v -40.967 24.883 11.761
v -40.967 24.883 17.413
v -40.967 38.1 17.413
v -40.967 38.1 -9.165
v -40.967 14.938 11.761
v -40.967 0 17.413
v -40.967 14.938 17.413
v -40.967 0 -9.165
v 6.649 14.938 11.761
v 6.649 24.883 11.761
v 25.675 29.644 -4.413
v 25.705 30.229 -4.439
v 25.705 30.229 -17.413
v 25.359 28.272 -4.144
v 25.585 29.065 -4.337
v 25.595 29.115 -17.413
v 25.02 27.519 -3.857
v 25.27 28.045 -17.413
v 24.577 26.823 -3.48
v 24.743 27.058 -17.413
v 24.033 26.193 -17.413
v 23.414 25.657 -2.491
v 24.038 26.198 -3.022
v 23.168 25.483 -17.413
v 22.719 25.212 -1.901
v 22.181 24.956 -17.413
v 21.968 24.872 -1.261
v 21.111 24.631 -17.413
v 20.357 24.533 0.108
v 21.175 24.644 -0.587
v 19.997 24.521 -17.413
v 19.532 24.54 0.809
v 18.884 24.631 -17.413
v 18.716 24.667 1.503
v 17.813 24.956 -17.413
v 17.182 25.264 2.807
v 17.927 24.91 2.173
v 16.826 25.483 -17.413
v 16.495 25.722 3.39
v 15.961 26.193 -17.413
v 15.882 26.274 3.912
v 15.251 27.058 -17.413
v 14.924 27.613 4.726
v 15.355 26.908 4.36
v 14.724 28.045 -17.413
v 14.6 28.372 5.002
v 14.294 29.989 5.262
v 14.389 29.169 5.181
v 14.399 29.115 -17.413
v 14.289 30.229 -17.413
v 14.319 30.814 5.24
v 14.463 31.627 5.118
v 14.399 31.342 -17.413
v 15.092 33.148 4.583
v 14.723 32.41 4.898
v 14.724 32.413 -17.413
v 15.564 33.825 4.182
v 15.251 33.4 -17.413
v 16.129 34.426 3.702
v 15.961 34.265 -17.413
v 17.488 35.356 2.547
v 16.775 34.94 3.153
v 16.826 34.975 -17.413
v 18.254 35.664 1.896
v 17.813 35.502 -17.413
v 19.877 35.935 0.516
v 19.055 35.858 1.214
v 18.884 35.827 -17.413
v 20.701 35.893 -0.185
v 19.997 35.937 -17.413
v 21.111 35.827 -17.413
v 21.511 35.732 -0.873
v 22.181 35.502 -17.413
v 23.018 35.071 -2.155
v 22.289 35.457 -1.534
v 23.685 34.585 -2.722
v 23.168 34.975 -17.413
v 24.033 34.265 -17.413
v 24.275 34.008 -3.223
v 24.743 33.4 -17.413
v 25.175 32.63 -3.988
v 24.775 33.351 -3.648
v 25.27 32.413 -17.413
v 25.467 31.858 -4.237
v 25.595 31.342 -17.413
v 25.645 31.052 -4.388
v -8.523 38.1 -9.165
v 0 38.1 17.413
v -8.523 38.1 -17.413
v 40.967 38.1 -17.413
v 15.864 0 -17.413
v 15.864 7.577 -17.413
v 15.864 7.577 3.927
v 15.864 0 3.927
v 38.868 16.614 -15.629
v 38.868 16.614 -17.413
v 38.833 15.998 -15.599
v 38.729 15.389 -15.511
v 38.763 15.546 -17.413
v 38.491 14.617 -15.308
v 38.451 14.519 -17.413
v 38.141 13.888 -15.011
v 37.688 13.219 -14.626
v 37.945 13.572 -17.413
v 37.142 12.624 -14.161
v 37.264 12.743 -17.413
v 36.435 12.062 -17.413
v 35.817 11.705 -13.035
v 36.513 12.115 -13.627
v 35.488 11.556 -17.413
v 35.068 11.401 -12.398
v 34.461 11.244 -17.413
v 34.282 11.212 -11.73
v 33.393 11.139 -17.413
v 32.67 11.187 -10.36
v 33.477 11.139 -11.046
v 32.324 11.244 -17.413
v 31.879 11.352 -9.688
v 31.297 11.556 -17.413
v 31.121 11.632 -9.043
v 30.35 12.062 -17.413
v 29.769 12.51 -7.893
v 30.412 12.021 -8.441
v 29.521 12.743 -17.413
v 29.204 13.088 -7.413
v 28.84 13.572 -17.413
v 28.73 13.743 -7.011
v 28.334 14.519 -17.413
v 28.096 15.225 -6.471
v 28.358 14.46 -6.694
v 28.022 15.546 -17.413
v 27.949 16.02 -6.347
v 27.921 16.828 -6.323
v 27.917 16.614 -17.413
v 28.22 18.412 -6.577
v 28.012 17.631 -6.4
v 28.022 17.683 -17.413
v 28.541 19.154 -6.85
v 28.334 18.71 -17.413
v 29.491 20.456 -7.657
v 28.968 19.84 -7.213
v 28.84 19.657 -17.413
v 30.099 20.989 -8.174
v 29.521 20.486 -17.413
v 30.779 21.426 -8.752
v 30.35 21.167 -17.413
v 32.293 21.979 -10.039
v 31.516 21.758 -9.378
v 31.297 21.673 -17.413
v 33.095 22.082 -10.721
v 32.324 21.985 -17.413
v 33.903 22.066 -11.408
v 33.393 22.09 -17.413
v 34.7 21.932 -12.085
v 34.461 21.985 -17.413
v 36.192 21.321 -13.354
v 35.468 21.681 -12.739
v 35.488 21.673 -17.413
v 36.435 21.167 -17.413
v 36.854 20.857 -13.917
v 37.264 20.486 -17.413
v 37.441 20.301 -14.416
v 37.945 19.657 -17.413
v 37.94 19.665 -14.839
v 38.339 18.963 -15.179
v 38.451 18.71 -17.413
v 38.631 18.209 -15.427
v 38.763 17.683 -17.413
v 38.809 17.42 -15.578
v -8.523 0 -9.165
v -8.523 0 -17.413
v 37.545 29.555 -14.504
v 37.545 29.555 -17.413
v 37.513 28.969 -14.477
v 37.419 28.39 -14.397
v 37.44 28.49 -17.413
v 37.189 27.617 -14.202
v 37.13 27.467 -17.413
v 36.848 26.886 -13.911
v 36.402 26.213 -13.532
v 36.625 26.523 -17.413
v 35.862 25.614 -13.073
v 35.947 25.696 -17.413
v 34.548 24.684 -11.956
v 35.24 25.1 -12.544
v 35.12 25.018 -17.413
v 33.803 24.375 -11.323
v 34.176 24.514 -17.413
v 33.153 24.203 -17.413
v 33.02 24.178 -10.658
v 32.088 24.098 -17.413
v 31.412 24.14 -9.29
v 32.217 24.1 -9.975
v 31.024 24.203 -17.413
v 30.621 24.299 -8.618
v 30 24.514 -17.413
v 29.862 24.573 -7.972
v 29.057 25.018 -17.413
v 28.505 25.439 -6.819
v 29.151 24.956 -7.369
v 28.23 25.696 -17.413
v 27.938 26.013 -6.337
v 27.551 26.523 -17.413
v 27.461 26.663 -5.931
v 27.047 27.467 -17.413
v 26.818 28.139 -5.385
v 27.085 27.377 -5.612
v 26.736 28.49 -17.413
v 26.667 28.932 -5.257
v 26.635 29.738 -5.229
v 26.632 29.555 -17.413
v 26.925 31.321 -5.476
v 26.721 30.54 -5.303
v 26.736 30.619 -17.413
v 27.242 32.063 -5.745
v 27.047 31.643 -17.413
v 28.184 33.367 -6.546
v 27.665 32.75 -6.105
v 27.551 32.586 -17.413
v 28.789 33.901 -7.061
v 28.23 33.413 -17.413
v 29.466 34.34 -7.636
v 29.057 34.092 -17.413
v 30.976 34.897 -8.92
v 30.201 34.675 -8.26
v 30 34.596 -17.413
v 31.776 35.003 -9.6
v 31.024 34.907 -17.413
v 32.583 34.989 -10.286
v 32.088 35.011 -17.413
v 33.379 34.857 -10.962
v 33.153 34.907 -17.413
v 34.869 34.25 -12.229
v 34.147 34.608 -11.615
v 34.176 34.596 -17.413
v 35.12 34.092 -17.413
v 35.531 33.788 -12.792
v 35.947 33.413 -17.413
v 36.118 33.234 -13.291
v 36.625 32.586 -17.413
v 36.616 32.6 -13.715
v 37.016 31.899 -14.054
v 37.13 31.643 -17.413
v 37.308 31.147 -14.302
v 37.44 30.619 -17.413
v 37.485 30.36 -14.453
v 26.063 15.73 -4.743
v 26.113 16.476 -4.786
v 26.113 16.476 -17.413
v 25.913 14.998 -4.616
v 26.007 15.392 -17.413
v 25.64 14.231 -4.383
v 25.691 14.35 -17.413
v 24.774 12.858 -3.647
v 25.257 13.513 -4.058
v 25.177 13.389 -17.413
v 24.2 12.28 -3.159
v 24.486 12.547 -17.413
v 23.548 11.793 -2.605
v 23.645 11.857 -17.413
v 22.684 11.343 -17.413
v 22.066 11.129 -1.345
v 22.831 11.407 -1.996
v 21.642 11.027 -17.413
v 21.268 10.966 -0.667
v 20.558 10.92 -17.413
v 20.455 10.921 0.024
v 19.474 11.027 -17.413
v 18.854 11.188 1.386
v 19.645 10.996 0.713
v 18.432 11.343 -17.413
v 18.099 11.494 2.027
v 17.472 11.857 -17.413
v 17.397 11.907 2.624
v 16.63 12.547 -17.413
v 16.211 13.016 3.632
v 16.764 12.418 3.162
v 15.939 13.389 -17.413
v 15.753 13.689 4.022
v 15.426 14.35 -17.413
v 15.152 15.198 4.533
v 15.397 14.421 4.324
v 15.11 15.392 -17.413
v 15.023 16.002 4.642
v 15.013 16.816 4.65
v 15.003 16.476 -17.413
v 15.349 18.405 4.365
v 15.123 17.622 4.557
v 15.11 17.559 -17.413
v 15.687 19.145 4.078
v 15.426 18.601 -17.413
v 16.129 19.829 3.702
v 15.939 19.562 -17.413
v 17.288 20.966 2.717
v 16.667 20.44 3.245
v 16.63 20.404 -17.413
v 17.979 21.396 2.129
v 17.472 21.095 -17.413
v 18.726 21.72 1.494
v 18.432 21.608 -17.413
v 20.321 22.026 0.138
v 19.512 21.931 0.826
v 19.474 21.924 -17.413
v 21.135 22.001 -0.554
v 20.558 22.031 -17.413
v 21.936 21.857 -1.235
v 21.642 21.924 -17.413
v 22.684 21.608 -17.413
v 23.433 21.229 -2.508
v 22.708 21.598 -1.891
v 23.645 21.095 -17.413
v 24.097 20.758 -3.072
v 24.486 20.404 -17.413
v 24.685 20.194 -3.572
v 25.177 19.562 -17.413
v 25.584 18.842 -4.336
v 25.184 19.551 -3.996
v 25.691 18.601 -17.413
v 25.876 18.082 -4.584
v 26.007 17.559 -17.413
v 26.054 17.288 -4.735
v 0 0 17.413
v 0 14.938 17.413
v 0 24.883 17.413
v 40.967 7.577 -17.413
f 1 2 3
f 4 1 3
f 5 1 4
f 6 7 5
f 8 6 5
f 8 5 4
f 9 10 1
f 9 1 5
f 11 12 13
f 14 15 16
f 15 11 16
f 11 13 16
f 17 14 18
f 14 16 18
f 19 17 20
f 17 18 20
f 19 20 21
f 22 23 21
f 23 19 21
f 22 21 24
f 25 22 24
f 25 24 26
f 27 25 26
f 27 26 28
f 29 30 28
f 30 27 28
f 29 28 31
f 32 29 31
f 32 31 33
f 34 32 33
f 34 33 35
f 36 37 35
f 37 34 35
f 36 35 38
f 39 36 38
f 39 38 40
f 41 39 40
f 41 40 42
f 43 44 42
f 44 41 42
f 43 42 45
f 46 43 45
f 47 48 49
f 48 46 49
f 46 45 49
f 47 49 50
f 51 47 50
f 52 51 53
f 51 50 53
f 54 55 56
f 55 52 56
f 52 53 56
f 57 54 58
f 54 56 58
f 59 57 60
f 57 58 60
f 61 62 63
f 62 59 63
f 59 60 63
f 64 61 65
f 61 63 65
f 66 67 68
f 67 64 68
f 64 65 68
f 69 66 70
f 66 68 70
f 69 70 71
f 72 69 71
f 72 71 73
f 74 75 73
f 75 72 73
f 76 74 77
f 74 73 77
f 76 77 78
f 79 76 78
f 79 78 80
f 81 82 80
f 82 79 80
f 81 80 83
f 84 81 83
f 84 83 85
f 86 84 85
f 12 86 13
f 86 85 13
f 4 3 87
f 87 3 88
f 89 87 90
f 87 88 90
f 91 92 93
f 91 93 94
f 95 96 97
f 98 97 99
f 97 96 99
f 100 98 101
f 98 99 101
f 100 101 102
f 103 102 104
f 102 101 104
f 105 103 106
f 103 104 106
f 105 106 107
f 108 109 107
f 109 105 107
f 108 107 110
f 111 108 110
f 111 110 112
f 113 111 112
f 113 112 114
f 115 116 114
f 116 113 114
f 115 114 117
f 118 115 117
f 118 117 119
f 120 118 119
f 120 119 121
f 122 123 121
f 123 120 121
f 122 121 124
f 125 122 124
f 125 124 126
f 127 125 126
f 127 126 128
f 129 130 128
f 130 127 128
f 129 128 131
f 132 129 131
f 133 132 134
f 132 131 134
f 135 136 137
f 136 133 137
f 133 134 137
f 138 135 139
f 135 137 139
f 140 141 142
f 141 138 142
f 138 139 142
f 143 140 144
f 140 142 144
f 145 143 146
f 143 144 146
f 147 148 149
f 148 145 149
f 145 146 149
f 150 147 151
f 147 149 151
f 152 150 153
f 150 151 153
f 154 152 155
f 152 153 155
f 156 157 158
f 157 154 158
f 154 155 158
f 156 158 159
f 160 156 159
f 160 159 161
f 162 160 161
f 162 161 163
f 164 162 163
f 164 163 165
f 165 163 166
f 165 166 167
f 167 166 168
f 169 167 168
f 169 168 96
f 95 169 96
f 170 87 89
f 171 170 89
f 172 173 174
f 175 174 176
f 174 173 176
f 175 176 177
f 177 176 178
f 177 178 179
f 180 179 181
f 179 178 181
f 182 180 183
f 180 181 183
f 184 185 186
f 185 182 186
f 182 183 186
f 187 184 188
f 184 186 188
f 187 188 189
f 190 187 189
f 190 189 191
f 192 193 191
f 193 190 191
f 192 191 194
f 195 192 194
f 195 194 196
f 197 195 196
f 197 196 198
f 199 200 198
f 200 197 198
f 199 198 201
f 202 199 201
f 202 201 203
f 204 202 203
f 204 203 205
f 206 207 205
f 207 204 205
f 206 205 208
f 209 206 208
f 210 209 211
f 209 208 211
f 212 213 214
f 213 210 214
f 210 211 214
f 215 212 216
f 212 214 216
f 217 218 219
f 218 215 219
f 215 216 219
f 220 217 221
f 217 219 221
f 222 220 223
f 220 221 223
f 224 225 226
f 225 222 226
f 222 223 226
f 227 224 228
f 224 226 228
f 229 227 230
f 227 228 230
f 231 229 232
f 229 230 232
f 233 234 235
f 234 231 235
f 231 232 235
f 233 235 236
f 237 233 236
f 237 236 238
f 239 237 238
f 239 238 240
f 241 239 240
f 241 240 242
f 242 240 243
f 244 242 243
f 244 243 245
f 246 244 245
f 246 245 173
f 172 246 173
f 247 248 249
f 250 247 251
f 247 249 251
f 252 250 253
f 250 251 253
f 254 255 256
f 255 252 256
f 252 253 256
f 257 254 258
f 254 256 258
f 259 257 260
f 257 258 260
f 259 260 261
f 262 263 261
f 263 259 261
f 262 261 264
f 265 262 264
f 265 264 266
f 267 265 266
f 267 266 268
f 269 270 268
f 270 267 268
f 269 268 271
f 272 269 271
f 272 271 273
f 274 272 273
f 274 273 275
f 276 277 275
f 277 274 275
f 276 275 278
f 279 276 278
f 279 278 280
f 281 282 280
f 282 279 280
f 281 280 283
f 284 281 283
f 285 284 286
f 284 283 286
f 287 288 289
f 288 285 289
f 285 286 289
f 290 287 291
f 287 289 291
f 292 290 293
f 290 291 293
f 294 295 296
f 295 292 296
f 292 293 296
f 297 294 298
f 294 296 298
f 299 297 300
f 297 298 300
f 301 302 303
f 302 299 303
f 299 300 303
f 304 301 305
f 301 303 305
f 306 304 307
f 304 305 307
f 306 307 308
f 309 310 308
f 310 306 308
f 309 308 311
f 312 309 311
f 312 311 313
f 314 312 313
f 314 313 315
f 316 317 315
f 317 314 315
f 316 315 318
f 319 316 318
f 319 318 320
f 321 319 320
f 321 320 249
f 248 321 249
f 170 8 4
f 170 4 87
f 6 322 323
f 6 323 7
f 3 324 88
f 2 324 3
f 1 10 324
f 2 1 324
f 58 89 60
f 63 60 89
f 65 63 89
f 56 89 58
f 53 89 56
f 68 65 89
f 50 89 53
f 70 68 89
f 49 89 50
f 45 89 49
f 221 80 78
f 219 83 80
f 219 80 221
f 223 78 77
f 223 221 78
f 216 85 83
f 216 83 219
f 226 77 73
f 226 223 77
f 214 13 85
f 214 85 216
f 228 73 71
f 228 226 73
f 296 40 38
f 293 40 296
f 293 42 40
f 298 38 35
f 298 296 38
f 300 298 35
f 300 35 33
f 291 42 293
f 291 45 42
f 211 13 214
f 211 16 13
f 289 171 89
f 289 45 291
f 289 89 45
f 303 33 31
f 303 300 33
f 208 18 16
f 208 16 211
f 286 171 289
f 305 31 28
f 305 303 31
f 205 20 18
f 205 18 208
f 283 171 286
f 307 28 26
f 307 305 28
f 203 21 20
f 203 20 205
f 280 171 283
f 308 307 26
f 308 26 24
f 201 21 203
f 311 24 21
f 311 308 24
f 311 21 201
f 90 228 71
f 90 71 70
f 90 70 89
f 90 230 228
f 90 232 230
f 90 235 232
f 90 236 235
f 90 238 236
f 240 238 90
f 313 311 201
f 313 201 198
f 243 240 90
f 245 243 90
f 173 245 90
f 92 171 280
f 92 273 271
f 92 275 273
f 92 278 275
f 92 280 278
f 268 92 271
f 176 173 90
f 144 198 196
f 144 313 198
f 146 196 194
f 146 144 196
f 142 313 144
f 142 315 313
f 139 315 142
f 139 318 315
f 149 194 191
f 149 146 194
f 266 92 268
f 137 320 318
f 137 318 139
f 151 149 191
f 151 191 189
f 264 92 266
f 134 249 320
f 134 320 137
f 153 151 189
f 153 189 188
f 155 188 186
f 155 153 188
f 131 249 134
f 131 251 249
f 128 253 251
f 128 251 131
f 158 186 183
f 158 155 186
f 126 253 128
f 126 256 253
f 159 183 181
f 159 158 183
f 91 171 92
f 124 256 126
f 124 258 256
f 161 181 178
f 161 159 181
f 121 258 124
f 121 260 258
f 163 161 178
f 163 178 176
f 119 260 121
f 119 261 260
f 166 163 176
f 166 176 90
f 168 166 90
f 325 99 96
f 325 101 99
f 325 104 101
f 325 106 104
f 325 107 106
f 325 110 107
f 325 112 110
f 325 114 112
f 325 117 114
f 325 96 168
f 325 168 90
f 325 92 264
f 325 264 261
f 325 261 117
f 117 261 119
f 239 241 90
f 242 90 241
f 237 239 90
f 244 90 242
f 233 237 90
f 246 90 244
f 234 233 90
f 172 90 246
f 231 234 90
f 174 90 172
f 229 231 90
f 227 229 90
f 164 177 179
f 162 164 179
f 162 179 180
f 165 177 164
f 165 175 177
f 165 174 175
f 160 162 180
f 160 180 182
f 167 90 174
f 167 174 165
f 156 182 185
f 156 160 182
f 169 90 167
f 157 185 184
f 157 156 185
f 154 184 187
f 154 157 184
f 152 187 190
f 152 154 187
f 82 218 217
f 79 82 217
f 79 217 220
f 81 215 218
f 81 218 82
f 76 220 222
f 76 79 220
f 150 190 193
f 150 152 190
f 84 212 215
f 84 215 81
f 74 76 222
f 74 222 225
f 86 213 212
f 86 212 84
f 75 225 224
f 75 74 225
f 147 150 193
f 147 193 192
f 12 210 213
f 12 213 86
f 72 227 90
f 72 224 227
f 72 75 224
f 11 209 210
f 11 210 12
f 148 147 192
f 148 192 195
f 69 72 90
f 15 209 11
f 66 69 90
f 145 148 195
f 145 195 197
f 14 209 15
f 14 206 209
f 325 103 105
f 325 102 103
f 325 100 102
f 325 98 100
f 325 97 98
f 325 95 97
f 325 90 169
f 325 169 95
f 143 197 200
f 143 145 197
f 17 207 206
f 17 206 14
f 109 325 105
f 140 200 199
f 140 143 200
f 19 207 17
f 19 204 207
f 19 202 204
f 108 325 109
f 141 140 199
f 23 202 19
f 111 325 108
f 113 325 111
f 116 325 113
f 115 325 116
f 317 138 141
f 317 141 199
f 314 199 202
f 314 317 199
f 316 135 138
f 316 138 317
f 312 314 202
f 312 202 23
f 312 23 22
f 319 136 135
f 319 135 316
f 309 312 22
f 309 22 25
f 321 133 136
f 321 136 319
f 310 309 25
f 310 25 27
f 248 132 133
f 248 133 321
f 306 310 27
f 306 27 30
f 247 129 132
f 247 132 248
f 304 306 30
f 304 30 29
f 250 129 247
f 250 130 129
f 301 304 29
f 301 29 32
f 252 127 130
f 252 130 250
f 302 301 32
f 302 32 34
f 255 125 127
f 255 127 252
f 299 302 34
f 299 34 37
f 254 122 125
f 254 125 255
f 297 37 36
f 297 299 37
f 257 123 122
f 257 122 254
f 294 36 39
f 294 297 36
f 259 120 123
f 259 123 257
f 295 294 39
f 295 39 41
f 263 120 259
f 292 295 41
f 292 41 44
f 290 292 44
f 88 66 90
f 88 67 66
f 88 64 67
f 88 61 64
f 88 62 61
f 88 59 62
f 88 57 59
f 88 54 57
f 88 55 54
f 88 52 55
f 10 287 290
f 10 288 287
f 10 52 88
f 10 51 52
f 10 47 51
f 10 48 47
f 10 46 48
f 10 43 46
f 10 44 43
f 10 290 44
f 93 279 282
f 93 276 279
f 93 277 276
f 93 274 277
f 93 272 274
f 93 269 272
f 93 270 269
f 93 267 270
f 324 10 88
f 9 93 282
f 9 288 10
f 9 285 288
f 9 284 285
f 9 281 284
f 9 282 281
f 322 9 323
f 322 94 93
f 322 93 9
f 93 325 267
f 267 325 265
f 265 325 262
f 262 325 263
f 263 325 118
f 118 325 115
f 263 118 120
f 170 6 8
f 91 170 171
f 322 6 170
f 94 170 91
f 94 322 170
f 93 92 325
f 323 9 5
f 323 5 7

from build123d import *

# Parameters (mm, degrees)
F1_DEPTH = 38.1
F2_W     = 25.103066
F2_H     = 7.577248
F3_DEPTH = 25.4
F4_W     = 9.944637
F4_H     = 5.652566
F5_DEPTH = 228.6
F6_R     = 5.456635
F6_R_2   = 5.70769
F6_R_3   = 5.555233
F6_R_4   = 5.475629
F7_DEPTH = 101.6


with BuildPart() as f1:
    # F0 (on Front) → F1 (new body)
    with BuildSketch(Plane.XZ):
        Polygon((0, 17.413402), (-40.967319, 17.413402), (-40.967319, -9.164948), (-8.523404, -9.164948), (-8.523404, -17.413402), (40.967319, -17.413402), align=None)
    extrude(amount=-F1_DEPTH)

    # F2 (on face) → F3 (cut)
    with BuildSketch(Plane(origin=(0, 0, -17.413402), x_dir=(1, 0, 0), z_dir=(0, 0, -1))):
        with Locations((28.415786, -3.788624)):
            Rectangle(F2_W, F2_H)
    extrude(amount=-F3_DEPTH, mode=Mode.SUBTRACT)

    # F4 (on face) → F5 (cut)
    with BuildSketch(Plane(origin=(-40.967319, 0, 0), x_dir=(0, -1, 0), z_dir=(-1, 0, 0))):
        with Locations((-19.910272, 14.587119)):
            Rectangle(F4_W, F4_H)
    extrude(amount=-F5_DEPTH, mode=Mode.SUBTRACT)

    # F6 (on face) → F7 (cut)
    with BuildSketch(Plane(origin=(0, 0, -17.413402), x_dir=(1, 0, 0), z_dir=(0, 0, -1))):
        with Locations((32.08825, -29.554859)):
            Circle(F6_R)
        with Locations((19.997094, -30.228976)):
            Circle(F6_R_2)
        with Locations((20.558245, -16.475564)):
            Circle(F6_R_3)
        with Locations((33.392582, -16.614418)):
            Circle(F6_R_4)
    extrude(amount=-F7_DEPTH, mode=Mode.SUBTRACT)


solid = f1.part
